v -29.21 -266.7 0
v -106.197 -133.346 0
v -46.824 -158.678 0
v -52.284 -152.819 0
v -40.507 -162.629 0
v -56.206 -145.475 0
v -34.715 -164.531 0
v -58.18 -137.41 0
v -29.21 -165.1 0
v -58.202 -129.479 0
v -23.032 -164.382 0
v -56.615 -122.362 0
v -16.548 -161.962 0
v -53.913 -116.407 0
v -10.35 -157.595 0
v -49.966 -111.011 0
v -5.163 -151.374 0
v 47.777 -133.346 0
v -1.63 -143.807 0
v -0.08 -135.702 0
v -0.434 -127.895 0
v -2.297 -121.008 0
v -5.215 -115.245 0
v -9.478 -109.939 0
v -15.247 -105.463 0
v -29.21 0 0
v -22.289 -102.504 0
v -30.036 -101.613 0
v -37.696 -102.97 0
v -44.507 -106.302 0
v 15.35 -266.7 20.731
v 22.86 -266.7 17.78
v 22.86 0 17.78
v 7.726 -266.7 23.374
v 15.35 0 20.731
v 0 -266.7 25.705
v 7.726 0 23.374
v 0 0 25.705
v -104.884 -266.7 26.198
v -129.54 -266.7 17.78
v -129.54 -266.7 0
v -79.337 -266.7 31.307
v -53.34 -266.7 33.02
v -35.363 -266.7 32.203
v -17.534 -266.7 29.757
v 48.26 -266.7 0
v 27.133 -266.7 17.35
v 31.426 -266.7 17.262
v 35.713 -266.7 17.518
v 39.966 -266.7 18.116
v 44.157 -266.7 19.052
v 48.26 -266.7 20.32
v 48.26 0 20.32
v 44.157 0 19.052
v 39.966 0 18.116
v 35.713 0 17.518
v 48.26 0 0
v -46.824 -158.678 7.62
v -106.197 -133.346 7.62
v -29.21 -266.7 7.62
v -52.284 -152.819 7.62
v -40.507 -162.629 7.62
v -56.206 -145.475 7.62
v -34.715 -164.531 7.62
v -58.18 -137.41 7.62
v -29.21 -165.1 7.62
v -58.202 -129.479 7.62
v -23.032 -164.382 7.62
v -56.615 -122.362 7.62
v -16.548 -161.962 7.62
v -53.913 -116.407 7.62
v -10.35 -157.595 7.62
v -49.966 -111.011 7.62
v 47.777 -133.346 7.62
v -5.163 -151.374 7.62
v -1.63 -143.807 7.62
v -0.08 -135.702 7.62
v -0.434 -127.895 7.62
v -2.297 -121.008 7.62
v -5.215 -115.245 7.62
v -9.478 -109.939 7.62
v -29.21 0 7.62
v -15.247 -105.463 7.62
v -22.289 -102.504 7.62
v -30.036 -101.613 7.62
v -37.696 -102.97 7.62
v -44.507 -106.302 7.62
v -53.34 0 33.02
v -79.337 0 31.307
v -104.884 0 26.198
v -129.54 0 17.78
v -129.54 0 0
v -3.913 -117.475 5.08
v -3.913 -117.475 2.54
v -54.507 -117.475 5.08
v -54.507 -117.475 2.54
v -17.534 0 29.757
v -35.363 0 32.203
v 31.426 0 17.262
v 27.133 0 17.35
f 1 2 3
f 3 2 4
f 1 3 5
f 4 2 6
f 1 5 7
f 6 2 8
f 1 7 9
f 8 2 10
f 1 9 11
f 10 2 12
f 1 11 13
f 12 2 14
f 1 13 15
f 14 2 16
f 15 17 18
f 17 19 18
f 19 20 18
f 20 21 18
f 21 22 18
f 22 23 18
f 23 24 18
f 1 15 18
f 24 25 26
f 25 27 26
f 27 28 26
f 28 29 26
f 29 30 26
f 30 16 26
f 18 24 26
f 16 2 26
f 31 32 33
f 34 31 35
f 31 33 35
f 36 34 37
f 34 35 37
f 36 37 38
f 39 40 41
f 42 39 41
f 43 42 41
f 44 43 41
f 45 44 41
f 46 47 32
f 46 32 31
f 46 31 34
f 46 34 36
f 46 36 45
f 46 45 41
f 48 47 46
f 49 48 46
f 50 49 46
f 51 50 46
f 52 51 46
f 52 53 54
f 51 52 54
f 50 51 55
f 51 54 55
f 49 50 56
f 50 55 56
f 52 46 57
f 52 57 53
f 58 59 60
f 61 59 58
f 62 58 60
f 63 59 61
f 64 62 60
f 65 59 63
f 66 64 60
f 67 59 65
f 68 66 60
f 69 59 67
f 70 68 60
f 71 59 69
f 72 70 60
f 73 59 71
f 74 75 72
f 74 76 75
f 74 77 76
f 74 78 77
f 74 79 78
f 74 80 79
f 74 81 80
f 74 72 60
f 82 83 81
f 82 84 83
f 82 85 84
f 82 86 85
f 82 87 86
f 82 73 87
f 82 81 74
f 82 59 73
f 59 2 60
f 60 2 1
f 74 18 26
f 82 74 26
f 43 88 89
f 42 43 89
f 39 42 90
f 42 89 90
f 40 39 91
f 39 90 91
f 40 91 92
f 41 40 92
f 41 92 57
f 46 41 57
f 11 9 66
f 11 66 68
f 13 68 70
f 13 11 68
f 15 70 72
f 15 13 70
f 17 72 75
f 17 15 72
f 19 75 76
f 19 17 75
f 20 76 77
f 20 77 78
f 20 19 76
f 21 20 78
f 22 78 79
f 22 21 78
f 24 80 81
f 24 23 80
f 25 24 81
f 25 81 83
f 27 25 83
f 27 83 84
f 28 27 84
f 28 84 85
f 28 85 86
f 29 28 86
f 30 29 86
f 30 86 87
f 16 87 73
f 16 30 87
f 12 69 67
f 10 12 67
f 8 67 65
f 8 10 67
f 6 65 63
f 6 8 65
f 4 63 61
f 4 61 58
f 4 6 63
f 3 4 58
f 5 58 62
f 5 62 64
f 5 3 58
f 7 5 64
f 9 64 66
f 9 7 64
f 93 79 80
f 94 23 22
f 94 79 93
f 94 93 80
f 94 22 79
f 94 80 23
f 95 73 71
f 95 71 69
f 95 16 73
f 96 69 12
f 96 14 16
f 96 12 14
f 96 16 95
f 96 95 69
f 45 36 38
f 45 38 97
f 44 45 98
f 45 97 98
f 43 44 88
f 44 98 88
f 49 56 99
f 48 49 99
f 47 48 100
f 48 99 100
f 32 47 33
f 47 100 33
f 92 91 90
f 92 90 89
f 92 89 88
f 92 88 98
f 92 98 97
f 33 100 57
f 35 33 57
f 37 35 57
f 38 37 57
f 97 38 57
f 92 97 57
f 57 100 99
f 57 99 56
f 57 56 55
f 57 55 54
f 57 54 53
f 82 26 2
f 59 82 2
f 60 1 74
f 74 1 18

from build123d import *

# Parameters (mm, degrees)
F1_DEPTH = 266.7
F2_DEPTH = 266.7
F4_DEPTH = 7.62


with BuildPart() as f1:
    # F0 (on Front) → F1 (new body)
    with BuildSketch(Plane.XZ):
        with BuildLine():
            ThreePointArc((35.7132010039, 17.5181751166), (29.2787431914, 17.2629117417), (22.8600185156, 17.78))
            ThreePointArc((22.8600185156, 17.78), (11.5511007159, 22.0915645826), (1.85156e-05, 25.7045565494))
            Line((1.85156e-05, 25.7045565494), (1.85156e-05, 0))
            Line((1.85156e-05, 0), (35.7132010039, 0))
            Line((35.7132010039, 0), (35.7132010039, 17.5181751166))
        make_face()
        with BuildLine():
            Line((1.85156e-05, 0), (1.85156e-05, 25.7045565494))
            ThreePointArc((1.85156e-05, 25.7045565494), (-26.4203264305, 31.1826191281), (-53.3399814844, 33.02))
            Line((-53.3399814844, 33.02), (-53.3399814844, 0))
            Line((-53.3399814844, 0), (1.85156e-05, 0))
        make_face()
        with BuildLine():
            Line((-53.3399814844, 0), (-53.3399814844, 33.02))
            ThreePointArc((-53.3399814844, 33.02), (-92.194510178, 29.1726434679), (-129.5399814844, 17.78))
            Line((-129.5399814844, 17.78), (-129.5399814844, 0))
            Line((-129.5399814844, 0), (-53.3399814844, 0))
        make_face()
        with BuildLine():
            ThreePointArc((48.2600185156, 20.32), (42.0707910132, 18.5421165239), (35.7132010039, 17.5181751166))
            Line((35.7132010039, 17.5181751166), (35.7132010039, 0))
            Line((35.7132010039, 0), (48.2600185156, 0))
            Line((48.2600185156, 0), (48.2600185156, 20.32))
        make_face()
    extrude(amount=F1_DEPTH)

    # F0 (on Front) → F2 (join)
    with BuildSketch(Plane.XZ):
        with BuildLine():
            ThreePointArc((35.7132010039, 17.5181751166), (29.2787431914, 17.2629117417), (22.8600185156, 17.78))
            ThreePointArc((22.8600185156, 17.78), (11.5511007159, 22.0915645826), (1.85156e-05, 25.7045565494))
            Line((1.85156e-05, 25.7045565494), (1.85156e-05, 0))
            Line((1.85156e-05, 0), (35.7132010039, 0))
            Line((35.7132010039, 0), (35.7132010039, 17.5181751166))
        make_face()
        with BuildLine():
            Line((1.85156e-05, 0), (1.85156e-05, 25.7045565494))
            ThreePointArc((1.85156e-05, 25.7045565494), (-26.4203264305, 31.1826191281), (-53.3399814844, 33.02))
            Line((-53.3399814844, 33.02), (-53.3399814844, 0))
            Line((-53.3399814844, 0), (1.85156e-05, 0))
        make_face()
        with BuildLine():
            Line((-53.3399814844, 0), (-53.3399814844, 33.02))
            ThreePointArc((-53.3399814844, 33.02), (-92.194510178, 29.1726434679), (-129.5399814844, 17.78))
            Line((-129.5399814844, 17.78), (-129.5399814844, 0))
            Line((-129.5399814844, 0), (-53.3399814844, 0))
        make_face()
    extrude(amount=F2_DEPTH)


with BuildPart() as f4:
    # F3 (on Top) → F4 (new body)
    with BuildSketch(Plane.XY):
        Polygon((47.7774130199, -133.3460956812), (-29.2099869801, -7.3386e-06), (-106.1973869801, -133.3460956812), (-29.2099869801, -266.7000073386), align=None)
        with BuildLine():
            add(Edge.make_bspline(
                [(-29.2099869801, -165.1000073386), (21.383217109, -165.1000073386), (-3.9133849355, -117.4750073386), (-29.2099869801, -69.8500073386), (-54.5065890246, -117.4750073386), (-79.8031910691, -165.1000073386), (-29.2099869801, -165.1000073386)],
                knots=[0, 0, 0, 2.0943951024, 2.0943951024, 4.1887902048, 4.1887902048, 6.2831853072, 6.2831853072, 6.2831853072], degree=2, weights=[1, 0.5, 1, 0.5, 1, 0.5, 1]))
        make_face(mode=Mode.SUBTRACT)
    extrude(amount=F4_DEPTH)


solid = Compound([f1.part, f4.part])
